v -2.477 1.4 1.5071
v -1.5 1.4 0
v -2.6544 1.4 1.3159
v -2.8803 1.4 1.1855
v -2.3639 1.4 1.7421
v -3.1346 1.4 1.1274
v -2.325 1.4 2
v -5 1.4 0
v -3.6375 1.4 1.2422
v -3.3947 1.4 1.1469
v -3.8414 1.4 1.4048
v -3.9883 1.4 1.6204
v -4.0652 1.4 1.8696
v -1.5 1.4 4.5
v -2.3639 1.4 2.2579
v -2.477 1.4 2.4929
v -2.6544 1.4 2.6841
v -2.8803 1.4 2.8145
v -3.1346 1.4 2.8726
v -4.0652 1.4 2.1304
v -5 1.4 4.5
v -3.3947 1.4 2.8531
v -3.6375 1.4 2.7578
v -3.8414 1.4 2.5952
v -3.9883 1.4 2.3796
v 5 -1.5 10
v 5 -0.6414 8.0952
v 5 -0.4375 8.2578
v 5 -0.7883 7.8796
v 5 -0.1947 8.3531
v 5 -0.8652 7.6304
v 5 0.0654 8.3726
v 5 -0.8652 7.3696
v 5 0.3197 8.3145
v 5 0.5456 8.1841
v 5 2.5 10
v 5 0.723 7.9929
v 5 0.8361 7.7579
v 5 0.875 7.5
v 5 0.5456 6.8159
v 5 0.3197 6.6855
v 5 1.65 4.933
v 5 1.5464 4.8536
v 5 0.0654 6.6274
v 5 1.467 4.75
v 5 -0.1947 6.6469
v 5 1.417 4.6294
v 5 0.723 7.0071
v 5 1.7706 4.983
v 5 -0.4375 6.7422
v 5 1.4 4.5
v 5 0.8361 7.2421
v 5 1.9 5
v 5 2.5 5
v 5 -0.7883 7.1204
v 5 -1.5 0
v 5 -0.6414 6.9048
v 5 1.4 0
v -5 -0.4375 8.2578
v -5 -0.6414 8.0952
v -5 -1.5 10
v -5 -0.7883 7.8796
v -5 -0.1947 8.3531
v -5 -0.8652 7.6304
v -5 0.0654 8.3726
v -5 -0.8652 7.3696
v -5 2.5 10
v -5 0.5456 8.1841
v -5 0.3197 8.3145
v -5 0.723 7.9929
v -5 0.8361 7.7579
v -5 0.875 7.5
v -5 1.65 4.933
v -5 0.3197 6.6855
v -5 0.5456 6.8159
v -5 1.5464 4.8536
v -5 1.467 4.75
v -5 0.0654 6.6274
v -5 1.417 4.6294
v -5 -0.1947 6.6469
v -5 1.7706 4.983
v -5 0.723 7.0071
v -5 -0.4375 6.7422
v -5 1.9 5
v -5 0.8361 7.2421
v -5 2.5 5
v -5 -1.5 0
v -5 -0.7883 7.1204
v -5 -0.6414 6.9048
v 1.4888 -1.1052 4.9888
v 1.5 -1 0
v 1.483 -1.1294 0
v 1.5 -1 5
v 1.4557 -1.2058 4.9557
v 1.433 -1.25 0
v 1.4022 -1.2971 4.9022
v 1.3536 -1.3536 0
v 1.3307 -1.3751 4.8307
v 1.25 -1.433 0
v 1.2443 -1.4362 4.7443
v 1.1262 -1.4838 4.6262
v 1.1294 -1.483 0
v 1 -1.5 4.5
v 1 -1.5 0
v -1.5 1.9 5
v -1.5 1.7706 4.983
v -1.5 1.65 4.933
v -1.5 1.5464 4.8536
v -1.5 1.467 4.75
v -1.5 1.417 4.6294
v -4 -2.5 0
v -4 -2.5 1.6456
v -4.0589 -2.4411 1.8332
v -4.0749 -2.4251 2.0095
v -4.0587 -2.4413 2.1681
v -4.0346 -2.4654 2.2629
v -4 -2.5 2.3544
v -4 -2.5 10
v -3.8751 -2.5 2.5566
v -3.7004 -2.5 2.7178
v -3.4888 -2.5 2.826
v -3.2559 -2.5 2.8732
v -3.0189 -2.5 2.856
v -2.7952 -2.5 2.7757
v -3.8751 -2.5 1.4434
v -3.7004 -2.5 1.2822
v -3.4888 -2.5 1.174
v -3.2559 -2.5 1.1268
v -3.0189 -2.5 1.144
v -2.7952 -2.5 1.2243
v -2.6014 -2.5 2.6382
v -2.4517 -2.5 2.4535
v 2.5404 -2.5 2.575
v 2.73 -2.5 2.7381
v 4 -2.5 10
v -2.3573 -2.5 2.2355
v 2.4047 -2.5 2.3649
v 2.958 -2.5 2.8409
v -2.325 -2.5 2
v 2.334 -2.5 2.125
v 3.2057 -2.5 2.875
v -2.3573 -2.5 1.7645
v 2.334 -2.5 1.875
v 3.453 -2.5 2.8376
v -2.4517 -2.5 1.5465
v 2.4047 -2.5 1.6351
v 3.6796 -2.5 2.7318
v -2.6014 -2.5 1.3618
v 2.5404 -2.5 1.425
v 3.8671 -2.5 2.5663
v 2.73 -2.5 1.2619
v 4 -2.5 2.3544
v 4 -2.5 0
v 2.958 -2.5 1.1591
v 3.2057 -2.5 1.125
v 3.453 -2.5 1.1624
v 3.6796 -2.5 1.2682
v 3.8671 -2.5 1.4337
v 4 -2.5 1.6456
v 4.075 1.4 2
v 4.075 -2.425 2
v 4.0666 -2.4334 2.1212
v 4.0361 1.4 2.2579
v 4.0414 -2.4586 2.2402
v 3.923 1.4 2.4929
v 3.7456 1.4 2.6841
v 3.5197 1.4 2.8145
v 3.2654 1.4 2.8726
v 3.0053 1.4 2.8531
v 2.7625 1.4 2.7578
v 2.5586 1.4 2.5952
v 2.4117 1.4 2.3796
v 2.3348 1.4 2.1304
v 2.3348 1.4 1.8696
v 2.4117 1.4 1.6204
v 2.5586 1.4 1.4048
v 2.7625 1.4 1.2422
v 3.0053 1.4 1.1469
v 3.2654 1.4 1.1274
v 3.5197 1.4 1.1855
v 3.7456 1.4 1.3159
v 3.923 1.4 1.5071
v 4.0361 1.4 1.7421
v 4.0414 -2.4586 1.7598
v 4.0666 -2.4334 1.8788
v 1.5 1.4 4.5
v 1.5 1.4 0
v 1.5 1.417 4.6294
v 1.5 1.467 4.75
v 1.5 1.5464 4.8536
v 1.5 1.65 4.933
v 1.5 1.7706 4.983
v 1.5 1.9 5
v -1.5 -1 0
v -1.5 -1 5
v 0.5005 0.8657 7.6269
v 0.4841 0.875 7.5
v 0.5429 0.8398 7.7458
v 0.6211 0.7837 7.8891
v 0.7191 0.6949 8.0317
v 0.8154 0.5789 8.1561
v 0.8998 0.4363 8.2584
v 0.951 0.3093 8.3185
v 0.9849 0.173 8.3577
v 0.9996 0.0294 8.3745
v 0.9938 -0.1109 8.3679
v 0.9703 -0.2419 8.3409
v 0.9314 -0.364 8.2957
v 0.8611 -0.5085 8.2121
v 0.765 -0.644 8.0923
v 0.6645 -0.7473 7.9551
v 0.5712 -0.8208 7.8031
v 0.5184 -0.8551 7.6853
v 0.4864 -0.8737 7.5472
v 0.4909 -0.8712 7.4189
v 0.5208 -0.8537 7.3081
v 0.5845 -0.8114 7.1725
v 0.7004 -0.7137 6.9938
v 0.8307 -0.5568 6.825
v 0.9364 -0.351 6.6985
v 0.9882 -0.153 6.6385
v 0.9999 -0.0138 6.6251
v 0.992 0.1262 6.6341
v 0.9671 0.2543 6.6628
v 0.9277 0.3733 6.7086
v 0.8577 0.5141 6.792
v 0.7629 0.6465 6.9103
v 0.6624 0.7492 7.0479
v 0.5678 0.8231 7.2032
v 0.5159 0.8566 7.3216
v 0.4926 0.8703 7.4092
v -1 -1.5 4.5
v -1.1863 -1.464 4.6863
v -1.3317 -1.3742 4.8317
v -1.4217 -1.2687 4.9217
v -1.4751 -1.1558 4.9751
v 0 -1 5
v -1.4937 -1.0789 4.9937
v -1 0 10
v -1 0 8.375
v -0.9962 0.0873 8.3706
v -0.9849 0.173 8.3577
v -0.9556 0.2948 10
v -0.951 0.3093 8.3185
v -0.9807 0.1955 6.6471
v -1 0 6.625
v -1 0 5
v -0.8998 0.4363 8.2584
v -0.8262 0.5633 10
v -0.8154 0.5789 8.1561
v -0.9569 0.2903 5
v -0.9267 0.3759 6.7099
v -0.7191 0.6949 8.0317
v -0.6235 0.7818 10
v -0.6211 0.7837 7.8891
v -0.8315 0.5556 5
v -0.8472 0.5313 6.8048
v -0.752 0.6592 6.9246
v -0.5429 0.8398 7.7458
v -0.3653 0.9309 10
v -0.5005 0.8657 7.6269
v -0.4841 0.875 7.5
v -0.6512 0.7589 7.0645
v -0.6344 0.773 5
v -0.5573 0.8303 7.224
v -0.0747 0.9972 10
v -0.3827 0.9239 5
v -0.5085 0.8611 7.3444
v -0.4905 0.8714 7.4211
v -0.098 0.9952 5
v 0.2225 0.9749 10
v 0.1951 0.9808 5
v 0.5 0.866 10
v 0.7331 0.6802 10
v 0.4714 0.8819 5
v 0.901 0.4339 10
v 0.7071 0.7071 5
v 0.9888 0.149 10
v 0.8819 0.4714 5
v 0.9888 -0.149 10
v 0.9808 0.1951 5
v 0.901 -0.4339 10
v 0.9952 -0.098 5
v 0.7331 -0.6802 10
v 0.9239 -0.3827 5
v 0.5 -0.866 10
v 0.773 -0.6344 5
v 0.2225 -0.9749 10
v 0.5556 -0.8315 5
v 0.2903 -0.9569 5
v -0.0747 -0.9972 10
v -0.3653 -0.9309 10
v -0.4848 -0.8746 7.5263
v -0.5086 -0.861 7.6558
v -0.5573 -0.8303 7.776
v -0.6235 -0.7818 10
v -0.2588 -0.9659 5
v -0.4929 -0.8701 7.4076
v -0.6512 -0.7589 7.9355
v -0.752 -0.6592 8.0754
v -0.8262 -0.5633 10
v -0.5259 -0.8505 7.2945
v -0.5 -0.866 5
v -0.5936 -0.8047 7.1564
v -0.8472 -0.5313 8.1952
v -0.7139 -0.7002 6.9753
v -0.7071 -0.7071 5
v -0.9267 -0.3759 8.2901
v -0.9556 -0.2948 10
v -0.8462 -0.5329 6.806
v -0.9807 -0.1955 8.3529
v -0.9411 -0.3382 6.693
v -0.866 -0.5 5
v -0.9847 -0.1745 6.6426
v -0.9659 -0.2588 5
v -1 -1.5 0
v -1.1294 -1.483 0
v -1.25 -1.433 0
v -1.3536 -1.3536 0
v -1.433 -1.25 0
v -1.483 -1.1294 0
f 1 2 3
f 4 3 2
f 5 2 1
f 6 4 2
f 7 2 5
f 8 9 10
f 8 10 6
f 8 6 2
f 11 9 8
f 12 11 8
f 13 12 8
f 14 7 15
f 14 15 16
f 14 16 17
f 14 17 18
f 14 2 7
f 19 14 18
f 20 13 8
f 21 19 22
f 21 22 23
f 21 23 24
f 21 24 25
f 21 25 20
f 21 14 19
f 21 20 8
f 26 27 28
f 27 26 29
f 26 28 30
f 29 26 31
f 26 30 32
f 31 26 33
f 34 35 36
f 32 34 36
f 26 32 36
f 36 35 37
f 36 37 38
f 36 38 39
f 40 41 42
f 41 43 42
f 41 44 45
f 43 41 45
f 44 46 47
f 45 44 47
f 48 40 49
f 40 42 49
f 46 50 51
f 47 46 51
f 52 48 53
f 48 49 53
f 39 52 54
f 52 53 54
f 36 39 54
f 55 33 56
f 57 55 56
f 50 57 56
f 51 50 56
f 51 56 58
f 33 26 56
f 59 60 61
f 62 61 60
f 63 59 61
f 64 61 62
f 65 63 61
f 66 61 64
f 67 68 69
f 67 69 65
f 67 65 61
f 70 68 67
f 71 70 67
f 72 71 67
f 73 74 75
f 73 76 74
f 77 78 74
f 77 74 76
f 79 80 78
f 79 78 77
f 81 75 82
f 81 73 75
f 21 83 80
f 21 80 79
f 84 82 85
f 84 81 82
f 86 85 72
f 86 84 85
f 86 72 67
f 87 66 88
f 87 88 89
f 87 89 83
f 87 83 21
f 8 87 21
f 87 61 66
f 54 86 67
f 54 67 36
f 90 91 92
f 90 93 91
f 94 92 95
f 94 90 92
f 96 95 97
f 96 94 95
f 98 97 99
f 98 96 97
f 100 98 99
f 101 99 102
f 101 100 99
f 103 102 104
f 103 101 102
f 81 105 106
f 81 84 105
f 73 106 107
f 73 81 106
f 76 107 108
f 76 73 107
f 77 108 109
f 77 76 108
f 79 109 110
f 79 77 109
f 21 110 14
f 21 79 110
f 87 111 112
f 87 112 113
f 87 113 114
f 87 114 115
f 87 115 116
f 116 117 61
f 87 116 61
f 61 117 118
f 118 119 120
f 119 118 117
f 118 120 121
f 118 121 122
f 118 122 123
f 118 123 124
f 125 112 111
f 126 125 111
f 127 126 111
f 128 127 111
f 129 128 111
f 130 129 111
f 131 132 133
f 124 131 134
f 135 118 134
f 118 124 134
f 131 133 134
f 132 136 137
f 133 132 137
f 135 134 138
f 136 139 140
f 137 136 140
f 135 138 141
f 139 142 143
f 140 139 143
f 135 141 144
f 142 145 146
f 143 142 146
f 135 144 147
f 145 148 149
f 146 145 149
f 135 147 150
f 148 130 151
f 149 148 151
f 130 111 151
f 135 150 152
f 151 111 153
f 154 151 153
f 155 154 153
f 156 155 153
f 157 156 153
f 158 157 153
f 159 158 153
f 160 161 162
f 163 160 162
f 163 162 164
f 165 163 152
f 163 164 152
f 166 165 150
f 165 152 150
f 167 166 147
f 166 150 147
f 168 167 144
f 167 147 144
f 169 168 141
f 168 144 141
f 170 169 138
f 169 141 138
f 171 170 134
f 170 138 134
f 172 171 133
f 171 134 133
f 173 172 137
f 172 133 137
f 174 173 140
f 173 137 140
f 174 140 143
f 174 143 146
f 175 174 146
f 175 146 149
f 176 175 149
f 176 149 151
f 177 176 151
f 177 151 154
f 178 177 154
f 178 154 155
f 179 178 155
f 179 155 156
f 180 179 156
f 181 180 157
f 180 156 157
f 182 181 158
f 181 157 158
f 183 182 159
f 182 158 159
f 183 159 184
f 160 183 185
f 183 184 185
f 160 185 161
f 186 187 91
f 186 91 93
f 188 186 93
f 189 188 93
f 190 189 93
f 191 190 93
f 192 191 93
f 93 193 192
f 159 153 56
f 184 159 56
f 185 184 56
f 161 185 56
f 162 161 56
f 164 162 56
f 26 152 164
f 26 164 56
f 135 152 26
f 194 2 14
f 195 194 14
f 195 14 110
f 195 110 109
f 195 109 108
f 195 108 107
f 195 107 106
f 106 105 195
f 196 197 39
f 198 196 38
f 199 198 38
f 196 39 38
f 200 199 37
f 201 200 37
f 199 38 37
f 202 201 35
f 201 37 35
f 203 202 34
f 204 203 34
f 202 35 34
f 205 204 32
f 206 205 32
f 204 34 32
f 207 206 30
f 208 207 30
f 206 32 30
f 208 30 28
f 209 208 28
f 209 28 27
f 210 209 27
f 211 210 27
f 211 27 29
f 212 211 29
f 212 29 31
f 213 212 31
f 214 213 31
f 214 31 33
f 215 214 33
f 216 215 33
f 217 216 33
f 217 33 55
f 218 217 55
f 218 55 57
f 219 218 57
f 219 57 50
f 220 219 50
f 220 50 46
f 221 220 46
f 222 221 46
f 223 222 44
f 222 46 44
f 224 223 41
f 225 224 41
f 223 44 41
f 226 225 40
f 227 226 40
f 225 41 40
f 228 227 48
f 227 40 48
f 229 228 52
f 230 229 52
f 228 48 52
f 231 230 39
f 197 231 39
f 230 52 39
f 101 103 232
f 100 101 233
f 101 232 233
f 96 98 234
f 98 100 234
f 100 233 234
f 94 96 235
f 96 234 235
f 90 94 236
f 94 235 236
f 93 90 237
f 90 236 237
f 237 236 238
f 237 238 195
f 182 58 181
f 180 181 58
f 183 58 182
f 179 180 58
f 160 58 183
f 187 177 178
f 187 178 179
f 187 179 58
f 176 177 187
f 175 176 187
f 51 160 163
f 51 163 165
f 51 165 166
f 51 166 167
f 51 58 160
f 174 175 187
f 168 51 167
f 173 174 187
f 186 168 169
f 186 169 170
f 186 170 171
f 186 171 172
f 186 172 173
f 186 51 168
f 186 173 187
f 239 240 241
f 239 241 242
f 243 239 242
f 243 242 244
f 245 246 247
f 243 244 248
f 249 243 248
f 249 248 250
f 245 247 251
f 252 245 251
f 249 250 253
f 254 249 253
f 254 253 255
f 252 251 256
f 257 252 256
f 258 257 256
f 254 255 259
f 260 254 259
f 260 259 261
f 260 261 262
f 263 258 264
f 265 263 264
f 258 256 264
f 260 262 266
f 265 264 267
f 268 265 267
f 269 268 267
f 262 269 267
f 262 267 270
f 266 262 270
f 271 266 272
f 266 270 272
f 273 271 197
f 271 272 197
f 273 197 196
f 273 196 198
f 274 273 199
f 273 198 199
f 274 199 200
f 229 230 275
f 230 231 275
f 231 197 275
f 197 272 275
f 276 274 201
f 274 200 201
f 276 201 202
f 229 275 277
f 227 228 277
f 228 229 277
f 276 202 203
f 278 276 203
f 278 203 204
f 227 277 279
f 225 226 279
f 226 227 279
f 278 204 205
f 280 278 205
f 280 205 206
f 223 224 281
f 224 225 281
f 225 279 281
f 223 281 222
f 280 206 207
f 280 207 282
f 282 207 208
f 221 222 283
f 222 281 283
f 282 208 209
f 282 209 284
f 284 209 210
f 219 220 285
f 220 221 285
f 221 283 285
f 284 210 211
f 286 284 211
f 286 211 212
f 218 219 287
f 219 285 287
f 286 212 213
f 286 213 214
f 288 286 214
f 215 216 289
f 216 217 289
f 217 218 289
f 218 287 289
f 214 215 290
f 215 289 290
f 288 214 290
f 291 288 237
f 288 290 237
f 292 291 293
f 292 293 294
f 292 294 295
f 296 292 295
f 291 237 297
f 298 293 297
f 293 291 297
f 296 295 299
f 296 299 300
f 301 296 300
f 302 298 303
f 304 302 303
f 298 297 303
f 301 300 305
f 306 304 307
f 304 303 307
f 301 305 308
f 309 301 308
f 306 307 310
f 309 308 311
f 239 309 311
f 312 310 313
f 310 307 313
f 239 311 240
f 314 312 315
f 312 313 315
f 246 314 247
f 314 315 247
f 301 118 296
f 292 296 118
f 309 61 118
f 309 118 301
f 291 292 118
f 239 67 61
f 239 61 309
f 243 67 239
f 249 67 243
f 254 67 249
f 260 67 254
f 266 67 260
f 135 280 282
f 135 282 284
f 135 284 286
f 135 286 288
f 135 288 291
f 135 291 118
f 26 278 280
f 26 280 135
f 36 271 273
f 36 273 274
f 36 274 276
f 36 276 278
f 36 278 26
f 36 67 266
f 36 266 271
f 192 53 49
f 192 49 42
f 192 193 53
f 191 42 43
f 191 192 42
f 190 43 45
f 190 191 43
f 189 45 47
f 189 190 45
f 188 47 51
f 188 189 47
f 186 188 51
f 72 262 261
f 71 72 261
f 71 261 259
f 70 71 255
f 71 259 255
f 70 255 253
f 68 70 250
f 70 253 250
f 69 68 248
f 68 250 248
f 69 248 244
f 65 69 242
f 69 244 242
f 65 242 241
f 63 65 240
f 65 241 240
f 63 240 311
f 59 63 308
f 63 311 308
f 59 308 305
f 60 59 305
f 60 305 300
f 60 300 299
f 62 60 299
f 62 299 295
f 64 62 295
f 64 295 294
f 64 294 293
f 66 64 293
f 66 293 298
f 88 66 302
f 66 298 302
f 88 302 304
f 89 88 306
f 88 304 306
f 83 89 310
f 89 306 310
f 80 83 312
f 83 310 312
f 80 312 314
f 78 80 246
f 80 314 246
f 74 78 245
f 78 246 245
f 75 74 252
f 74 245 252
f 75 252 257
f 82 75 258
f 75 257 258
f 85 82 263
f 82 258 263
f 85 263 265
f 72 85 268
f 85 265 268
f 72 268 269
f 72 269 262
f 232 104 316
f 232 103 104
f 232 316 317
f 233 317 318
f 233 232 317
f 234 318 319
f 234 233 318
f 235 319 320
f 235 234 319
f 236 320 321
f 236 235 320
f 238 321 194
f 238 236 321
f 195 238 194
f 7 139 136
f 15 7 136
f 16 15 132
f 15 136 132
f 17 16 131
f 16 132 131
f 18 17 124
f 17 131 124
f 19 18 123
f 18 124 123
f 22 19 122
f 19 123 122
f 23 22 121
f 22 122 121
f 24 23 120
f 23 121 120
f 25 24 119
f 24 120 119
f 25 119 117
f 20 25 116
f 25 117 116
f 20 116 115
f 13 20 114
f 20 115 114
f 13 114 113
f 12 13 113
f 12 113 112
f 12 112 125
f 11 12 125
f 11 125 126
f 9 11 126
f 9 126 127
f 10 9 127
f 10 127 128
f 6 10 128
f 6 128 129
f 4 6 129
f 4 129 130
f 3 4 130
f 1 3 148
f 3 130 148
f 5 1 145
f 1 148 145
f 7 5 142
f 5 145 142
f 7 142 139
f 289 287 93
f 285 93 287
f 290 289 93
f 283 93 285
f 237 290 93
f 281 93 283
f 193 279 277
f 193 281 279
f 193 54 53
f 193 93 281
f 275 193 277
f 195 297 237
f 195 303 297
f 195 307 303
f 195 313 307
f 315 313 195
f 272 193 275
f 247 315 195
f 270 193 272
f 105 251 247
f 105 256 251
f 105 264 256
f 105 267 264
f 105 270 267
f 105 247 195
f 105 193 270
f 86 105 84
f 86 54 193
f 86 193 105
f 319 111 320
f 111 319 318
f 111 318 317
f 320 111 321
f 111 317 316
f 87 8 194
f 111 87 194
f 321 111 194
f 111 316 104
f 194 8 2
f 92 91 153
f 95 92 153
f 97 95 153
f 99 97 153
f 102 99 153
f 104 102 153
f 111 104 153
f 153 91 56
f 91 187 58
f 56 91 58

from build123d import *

# Parameters (mm, degrees)
F0_W     = 10
F0_H     = 5
F1_DEPTH = 10
F2_W     = 3
F2_H     = 5
F3_DEPTH = 4
F4_W     = 10
F4_H     = 5
F5_DEPTH = 1.1
F6_R     = 0.5
F7_R     = 0.5
F8_SIZE  = 1
F10_D    = 1.75
F12_D    = 1.75
F14_D    = 2


with BuildPart() as f1:
    # F0 (on Top) → F1 (new body)
    with BuildSketch(Plane.XY):
        Rectangle(F0_W, F0_H)
    extrude(amount=F1_DEPTH)

    # F2 (on face) → F3 (cut)
    with BuildSketch(Plane(origin=(0, 2.5, 0), x_dir=(-1, 0, 0), z_dir=(0, 1, 0))):
        with Locations((0, 2.5)):
            Rectangle(F2_W, F2_H)
    extrude(amount=-F3_DEPTH, mode=Mode.SUBTRACT)

    # F4 (on face) → F5 (cut)
    with BuildSketch(Plane(origin=(0, 2.5, 0), x_dir=(-1, 0, 0), z_dir=(0, 1, 0))):
        with Locations((0, 2.5)):
            Rectangle(F4_W, F4_H)
    extrude(amount=-F5_DEPTH, mode=Mode.SUBTRACT)

    # F6
    f6_edges = [f1.edges().sort_by_distance(p)[0] for p in [
        (1.5, -1.5, 2.5),
        (-1.5, -1.5, 2.5),
        (0, -1.5, 5),
    ]]
    fillet(f6_edges, radius=F6_R)

    # F7
    f7_edges = [f1.edges().sort_by_distance(p)[0] for p in [
        (-3.25, 1.4, 5),
        (3.25, 1.4, 5),
    ]]
    fillet(f7_edges, radius=F7_R)

    # F8
    f8_edges = [f1.edges().sort_by_distance(p)[0] for p in [
        (5, -2.5, 5),
        (-5, -2.5, 5),
    ]]
    chamfer(f8_edges, length=F8_SIZE)

    # F10 (through all)
    with Locations(Plane(origin=(0, 1.4, 0), x_dir=(-1, 0, 0), z_dir=(0, 1, 0))):
        with Locations((-3.2, 2), (3.2, 2)):
            Hole(F10_D / 2)

    # F12 (through all)
    with Locations(Plane(origin=(-5, 0, 0), x_dir=(0, -1, 0), z_dir=(-1, 0, 0))):
        with Locations((0, 7.5)):
            Hole(F12_D / 2)

    # F14 (through all)
    with Locations(Plane.XY.offset(10)):
        with Locations((0, 0)):
            Hole(F14_D / 2)


solid = f1.part
